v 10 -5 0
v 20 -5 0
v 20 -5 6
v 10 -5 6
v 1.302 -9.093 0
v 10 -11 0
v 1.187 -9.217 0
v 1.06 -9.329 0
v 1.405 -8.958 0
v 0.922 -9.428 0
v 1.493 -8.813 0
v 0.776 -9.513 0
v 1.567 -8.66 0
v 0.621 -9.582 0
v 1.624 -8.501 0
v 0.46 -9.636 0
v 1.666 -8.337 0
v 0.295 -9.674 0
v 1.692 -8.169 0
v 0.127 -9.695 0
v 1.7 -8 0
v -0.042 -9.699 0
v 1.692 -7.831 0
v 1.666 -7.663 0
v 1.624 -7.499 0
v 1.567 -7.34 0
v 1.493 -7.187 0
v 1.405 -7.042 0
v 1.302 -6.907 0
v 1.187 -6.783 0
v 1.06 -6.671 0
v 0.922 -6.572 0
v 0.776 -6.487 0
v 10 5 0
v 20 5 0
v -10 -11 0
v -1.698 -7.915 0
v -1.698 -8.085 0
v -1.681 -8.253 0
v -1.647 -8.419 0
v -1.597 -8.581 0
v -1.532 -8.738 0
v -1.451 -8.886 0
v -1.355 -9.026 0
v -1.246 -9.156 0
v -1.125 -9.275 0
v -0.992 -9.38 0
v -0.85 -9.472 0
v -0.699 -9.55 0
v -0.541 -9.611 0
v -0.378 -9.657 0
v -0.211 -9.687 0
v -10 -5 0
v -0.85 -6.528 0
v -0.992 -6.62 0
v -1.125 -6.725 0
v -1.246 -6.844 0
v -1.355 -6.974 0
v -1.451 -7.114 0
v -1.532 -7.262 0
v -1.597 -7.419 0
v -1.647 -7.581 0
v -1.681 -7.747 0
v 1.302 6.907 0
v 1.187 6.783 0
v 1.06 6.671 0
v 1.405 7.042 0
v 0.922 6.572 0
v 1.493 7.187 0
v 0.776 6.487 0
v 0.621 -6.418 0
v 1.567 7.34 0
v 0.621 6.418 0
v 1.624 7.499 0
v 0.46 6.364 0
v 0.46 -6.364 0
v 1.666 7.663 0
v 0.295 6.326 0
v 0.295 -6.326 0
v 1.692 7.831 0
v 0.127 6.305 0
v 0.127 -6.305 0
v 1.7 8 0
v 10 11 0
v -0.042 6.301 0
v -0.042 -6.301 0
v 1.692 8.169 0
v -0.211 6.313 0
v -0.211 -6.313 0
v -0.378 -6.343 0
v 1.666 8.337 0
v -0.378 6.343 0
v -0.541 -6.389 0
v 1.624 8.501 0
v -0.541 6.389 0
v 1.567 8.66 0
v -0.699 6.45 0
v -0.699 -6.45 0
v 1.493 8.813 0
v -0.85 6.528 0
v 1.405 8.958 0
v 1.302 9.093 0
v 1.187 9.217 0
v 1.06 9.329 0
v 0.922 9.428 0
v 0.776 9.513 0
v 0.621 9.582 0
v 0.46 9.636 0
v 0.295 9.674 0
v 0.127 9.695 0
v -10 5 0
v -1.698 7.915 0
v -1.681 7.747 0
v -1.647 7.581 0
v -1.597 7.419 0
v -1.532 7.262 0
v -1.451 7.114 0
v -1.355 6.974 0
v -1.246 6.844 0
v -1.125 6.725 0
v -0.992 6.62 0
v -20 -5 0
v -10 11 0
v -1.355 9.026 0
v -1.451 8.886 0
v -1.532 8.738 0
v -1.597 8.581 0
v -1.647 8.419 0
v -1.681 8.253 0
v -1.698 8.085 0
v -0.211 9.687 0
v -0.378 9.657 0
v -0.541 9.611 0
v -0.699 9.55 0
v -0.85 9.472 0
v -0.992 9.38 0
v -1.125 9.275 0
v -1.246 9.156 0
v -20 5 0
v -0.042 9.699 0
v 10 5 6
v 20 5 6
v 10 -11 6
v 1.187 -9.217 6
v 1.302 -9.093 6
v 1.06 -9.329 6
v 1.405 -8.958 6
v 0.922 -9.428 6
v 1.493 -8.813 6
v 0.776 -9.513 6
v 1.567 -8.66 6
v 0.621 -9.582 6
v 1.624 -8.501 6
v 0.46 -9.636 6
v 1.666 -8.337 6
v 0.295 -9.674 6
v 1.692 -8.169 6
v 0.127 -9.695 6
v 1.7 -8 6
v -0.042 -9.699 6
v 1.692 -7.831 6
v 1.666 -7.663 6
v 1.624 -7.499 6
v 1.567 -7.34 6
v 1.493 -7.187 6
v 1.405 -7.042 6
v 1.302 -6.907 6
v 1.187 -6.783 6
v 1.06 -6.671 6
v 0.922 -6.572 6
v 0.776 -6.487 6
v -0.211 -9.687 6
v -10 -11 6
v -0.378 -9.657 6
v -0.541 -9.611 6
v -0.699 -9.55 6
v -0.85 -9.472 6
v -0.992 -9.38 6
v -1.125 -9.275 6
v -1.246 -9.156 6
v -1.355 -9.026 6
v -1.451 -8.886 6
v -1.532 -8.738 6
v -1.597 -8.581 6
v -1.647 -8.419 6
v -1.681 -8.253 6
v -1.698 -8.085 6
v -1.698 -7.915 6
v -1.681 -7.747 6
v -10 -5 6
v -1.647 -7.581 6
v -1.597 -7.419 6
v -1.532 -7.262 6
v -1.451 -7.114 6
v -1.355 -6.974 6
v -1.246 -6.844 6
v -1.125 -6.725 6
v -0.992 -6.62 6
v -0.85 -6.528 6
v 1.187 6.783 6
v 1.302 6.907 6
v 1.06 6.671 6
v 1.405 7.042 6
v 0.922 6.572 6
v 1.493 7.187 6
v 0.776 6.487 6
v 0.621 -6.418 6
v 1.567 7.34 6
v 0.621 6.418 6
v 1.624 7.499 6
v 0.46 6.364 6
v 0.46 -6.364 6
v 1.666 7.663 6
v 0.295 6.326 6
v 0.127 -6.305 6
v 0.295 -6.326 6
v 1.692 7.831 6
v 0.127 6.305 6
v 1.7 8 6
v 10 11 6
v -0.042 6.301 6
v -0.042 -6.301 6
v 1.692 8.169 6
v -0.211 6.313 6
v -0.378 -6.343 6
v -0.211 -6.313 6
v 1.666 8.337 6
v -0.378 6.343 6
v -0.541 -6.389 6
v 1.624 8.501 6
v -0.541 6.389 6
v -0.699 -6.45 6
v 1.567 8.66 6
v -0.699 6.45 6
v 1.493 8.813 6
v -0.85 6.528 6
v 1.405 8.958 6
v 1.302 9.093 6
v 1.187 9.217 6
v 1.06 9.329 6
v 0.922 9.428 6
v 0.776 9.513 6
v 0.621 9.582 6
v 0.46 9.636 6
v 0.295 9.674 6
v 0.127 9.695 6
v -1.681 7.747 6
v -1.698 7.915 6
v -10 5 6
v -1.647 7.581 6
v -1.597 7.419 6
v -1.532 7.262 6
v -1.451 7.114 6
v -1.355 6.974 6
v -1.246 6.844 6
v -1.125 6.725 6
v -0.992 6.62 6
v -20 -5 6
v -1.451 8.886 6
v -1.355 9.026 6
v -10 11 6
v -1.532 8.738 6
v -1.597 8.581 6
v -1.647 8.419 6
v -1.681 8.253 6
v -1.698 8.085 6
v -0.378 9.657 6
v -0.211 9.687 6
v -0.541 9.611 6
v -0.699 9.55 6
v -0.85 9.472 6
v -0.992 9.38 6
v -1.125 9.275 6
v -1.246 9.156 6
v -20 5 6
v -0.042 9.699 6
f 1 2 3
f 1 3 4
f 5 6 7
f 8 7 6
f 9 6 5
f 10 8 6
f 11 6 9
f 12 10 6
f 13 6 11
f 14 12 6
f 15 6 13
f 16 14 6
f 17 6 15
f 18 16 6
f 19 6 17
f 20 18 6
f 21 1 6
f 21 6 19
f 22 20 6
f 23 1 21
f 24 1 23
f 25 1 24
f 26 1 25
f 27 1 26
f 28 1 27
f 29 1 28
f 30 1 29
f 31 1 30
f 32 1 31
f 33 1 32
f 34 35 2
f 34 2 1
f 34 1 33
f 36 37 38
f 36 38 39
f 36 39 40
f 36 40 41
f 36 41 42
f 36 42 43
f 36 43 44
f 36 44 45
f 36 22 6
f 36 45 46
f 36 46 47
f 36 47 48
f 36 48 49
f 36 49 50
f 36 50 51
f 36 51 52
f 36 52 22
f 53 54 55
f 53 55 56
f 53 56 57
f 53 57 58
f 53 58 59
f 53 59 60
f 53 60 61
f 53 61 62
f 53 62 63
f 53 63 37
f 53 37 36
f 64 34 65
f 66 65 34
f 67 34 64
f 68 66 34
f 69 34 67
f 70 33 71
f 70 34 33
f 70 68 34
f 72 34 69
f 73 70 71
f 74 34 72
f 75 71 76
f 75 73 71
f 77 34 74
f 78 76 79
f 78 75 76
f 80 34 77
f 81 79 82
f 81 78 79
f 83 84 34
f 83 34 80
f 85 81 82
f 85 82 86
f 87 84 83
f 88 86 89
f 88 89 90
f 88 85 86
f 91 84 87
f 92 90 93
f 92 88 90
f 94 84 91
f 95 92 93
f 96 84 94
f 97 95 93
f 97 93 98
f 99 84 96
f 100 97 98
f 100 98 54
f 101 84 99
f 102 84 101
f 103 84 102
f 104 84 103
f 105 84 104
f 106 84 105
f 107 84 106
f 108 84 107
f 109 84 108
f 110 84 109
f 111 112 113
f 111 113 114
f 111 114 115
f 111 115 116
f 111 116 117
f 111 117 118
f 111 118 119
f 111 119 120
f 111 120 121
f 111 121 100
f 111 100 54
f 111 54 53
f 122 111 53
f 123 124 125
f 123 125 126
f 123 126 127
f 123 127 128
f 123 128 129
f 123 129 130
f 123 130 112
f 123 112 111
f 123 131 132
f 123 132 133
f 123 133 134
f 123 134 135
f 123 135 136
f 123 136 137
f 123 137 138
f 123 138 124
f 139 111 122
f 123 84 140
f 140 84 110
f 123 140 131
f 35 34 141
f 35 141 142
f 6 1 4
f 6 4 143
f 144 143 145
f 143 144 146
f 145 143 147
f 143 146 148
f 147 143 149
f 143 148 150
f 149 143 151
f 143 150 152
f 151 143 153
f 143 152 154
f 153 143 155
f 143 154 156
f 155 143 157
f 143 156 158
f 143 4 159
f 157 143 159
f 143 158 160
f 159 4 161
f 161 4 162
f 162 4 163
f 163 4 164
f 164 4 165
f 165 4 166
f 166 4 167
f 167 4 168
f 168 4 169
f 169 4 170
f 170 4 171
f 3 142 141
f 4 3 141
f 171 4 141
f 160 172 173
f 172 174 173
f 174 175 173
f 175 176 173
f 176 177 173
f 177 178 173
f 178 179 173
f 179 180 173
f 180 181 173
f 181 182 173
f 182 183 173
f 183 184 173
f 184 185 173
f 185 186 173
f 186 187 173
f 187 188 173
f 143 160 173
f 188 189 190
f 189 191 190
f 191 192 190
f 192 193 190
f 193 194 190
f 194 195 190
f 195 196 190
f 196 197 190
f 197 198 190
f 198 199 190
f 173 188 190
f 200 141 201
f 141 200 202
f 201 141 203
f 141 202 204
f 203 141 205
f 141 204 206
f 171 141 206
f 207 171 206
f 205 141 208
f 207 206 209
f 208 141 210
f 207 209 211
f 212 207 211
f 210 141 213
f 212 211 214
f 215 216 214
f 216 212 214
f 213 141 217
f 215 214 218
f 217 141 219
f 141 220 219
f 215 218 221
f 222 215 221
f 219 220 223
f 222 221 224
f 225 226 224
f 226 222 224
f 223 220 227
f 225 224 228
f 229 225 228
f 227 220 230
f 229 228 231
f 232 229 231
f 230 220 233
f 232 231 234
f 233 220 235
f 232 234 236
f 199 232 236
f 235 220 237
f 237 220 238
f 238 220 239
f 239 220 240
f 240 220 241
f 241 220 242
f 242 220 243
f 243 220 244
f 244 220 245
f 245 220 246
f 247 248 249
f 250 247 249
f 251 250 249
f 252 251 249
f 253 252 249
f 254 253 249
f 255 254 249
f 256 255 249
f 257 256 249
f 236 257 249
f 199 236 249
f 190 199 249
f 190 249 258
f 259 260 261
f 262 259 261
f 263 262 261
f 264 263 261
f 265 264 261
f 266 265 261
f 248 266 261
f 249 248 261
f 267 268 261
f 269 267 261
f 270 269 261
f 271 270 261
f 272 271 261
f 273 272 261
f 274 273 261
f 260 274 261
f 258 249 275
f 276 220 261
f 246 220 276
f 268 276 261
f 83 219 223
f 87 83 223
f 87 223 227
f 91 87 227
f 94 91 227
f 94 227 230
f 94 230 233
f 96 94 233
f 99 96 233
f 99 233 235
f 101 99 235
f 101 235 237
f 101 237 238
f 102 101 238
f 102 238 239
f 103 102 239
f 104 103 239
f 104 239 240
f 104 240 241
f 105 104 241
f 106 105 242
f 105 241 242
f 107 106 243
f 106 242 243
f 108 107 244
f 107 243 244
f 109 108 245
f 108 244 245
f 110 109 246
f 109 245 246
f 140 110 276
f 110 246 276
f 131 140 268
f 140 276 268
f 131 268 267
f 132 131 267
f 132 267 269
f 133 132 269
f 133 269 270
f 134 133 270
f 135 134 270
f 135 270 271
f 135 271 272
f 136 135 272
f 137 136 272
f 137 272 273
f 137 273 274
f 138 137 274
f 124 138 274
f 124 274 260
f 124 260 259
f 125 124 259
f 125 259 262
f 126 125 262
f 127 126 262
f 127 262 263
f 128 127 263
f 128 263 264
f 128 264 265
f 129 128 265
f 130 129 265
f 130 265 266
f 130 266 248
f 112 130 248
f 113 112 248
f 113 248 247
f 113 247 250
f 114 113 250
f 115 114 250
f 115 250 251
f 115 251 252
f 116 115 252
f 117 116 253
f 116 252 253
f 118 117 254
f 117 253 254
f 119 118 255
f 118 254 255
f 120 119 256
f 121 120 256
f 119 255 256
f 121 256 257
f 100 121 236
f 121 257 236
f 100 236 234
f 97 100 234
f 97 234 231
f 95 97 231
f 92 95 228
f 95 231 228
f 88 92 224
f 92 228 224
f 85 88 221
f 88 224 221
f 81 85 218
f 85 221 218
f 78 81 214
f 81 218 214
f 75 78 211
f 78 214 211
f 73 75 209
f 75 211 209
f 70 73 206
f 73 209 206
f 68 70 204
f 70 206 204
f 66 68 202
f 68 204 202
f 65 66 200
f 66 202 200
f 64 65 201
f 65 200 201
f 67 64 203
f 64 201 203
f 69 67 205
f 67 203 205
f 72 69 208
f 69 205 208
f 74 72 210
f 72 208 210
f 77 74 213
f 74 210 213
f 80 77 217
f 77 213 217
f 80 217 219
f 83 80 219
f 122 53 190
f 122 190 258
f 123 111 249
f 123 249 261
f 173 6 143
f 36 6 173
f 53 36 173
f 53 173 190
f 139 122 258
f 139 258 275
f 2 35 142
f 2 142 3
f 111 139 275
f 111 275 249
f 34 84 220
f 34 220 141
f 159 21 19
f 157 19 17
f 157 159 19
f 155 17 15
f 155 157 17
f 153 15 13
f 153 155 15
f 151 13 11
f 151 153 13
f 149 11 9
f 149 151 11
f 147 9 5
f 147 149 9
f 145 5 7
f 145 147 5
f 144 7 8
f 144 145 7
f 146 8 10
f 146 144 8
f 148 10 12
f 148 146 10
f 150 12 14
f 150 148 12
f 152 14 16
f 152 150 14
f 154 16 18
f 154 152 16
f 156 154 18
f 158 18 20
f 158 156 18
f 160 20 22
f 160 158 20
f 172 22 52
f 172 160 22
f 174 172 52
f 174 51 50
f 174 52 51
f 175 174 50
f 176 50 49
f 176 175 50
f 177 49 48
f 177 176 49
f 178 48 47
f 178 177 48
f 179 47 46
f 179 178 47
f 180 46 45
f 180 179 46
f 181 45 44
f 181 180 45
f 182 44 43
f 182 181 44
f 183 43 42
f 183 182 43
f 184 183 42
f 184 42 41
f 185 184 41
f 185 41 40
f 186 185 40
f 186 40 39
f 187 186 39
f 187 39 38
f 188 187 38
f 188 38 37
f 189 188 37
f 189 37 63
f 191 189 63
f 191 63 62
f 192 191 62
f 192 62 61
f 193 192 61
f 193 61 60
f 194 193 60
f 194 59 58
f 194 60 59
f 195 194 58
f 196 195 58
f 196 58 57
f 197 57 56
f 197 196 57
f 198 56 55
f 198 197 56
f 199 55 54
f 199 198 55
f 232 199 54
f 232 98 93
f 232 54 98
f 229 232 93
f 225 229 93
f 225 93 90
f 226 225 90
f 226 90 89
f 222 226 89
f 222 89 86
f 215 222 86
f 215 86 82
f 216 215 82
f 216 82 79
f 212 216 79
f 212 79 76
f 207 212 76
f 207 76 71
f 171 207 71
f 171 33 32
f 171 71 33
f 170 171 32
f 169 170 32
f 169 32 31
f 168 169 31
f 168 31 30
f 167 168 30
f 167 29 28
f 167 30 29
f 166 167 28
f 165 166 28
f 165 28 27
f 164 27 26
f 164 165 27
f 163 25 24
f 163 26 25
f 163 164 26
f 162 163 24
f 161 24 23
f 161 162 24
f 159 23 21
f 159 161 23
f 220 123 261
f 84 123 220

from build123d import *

# Parameters (mm, degrees)
PAD_DEPTH    = 6
SKETCH001_R  = 1.7
POCKET_DEPTH = 98.087915


with BuildPart() as part:
    # Sketch → Pad (new body)
    with BuildSketch(Plane.XY):
        Polygon((-20, -5), (-20, 5), (-10, 5), (-10, 11), (10, 11), (10, 5), (20, 5), (20, -5), (10, -5), (10, -11), (-10, -11), (-10, -5), align=None)
    extrude(amount=PAD_DEPTH)

    # Sketch001 (on Face14 of Pad) → Pocket (cut, through all)
    with BuildSketch(Plane.XY.offset(6)):
        with Locations((0, 8)):
            Circle(SKETCH001_R)
    pocket = extrude(amount=-POCKET_DEPTH, mode=Mode.SUBTRACT)

    # Mirrored: Pocket across Sketch001 H_Axis
    add(pocket.mirror(Plane(origin=(0, 0, 6), x_dir=(0, 0, 1), z_dir=(0, 1, 0))), mode=Mode.SUBTRACT)


solid = part.part
